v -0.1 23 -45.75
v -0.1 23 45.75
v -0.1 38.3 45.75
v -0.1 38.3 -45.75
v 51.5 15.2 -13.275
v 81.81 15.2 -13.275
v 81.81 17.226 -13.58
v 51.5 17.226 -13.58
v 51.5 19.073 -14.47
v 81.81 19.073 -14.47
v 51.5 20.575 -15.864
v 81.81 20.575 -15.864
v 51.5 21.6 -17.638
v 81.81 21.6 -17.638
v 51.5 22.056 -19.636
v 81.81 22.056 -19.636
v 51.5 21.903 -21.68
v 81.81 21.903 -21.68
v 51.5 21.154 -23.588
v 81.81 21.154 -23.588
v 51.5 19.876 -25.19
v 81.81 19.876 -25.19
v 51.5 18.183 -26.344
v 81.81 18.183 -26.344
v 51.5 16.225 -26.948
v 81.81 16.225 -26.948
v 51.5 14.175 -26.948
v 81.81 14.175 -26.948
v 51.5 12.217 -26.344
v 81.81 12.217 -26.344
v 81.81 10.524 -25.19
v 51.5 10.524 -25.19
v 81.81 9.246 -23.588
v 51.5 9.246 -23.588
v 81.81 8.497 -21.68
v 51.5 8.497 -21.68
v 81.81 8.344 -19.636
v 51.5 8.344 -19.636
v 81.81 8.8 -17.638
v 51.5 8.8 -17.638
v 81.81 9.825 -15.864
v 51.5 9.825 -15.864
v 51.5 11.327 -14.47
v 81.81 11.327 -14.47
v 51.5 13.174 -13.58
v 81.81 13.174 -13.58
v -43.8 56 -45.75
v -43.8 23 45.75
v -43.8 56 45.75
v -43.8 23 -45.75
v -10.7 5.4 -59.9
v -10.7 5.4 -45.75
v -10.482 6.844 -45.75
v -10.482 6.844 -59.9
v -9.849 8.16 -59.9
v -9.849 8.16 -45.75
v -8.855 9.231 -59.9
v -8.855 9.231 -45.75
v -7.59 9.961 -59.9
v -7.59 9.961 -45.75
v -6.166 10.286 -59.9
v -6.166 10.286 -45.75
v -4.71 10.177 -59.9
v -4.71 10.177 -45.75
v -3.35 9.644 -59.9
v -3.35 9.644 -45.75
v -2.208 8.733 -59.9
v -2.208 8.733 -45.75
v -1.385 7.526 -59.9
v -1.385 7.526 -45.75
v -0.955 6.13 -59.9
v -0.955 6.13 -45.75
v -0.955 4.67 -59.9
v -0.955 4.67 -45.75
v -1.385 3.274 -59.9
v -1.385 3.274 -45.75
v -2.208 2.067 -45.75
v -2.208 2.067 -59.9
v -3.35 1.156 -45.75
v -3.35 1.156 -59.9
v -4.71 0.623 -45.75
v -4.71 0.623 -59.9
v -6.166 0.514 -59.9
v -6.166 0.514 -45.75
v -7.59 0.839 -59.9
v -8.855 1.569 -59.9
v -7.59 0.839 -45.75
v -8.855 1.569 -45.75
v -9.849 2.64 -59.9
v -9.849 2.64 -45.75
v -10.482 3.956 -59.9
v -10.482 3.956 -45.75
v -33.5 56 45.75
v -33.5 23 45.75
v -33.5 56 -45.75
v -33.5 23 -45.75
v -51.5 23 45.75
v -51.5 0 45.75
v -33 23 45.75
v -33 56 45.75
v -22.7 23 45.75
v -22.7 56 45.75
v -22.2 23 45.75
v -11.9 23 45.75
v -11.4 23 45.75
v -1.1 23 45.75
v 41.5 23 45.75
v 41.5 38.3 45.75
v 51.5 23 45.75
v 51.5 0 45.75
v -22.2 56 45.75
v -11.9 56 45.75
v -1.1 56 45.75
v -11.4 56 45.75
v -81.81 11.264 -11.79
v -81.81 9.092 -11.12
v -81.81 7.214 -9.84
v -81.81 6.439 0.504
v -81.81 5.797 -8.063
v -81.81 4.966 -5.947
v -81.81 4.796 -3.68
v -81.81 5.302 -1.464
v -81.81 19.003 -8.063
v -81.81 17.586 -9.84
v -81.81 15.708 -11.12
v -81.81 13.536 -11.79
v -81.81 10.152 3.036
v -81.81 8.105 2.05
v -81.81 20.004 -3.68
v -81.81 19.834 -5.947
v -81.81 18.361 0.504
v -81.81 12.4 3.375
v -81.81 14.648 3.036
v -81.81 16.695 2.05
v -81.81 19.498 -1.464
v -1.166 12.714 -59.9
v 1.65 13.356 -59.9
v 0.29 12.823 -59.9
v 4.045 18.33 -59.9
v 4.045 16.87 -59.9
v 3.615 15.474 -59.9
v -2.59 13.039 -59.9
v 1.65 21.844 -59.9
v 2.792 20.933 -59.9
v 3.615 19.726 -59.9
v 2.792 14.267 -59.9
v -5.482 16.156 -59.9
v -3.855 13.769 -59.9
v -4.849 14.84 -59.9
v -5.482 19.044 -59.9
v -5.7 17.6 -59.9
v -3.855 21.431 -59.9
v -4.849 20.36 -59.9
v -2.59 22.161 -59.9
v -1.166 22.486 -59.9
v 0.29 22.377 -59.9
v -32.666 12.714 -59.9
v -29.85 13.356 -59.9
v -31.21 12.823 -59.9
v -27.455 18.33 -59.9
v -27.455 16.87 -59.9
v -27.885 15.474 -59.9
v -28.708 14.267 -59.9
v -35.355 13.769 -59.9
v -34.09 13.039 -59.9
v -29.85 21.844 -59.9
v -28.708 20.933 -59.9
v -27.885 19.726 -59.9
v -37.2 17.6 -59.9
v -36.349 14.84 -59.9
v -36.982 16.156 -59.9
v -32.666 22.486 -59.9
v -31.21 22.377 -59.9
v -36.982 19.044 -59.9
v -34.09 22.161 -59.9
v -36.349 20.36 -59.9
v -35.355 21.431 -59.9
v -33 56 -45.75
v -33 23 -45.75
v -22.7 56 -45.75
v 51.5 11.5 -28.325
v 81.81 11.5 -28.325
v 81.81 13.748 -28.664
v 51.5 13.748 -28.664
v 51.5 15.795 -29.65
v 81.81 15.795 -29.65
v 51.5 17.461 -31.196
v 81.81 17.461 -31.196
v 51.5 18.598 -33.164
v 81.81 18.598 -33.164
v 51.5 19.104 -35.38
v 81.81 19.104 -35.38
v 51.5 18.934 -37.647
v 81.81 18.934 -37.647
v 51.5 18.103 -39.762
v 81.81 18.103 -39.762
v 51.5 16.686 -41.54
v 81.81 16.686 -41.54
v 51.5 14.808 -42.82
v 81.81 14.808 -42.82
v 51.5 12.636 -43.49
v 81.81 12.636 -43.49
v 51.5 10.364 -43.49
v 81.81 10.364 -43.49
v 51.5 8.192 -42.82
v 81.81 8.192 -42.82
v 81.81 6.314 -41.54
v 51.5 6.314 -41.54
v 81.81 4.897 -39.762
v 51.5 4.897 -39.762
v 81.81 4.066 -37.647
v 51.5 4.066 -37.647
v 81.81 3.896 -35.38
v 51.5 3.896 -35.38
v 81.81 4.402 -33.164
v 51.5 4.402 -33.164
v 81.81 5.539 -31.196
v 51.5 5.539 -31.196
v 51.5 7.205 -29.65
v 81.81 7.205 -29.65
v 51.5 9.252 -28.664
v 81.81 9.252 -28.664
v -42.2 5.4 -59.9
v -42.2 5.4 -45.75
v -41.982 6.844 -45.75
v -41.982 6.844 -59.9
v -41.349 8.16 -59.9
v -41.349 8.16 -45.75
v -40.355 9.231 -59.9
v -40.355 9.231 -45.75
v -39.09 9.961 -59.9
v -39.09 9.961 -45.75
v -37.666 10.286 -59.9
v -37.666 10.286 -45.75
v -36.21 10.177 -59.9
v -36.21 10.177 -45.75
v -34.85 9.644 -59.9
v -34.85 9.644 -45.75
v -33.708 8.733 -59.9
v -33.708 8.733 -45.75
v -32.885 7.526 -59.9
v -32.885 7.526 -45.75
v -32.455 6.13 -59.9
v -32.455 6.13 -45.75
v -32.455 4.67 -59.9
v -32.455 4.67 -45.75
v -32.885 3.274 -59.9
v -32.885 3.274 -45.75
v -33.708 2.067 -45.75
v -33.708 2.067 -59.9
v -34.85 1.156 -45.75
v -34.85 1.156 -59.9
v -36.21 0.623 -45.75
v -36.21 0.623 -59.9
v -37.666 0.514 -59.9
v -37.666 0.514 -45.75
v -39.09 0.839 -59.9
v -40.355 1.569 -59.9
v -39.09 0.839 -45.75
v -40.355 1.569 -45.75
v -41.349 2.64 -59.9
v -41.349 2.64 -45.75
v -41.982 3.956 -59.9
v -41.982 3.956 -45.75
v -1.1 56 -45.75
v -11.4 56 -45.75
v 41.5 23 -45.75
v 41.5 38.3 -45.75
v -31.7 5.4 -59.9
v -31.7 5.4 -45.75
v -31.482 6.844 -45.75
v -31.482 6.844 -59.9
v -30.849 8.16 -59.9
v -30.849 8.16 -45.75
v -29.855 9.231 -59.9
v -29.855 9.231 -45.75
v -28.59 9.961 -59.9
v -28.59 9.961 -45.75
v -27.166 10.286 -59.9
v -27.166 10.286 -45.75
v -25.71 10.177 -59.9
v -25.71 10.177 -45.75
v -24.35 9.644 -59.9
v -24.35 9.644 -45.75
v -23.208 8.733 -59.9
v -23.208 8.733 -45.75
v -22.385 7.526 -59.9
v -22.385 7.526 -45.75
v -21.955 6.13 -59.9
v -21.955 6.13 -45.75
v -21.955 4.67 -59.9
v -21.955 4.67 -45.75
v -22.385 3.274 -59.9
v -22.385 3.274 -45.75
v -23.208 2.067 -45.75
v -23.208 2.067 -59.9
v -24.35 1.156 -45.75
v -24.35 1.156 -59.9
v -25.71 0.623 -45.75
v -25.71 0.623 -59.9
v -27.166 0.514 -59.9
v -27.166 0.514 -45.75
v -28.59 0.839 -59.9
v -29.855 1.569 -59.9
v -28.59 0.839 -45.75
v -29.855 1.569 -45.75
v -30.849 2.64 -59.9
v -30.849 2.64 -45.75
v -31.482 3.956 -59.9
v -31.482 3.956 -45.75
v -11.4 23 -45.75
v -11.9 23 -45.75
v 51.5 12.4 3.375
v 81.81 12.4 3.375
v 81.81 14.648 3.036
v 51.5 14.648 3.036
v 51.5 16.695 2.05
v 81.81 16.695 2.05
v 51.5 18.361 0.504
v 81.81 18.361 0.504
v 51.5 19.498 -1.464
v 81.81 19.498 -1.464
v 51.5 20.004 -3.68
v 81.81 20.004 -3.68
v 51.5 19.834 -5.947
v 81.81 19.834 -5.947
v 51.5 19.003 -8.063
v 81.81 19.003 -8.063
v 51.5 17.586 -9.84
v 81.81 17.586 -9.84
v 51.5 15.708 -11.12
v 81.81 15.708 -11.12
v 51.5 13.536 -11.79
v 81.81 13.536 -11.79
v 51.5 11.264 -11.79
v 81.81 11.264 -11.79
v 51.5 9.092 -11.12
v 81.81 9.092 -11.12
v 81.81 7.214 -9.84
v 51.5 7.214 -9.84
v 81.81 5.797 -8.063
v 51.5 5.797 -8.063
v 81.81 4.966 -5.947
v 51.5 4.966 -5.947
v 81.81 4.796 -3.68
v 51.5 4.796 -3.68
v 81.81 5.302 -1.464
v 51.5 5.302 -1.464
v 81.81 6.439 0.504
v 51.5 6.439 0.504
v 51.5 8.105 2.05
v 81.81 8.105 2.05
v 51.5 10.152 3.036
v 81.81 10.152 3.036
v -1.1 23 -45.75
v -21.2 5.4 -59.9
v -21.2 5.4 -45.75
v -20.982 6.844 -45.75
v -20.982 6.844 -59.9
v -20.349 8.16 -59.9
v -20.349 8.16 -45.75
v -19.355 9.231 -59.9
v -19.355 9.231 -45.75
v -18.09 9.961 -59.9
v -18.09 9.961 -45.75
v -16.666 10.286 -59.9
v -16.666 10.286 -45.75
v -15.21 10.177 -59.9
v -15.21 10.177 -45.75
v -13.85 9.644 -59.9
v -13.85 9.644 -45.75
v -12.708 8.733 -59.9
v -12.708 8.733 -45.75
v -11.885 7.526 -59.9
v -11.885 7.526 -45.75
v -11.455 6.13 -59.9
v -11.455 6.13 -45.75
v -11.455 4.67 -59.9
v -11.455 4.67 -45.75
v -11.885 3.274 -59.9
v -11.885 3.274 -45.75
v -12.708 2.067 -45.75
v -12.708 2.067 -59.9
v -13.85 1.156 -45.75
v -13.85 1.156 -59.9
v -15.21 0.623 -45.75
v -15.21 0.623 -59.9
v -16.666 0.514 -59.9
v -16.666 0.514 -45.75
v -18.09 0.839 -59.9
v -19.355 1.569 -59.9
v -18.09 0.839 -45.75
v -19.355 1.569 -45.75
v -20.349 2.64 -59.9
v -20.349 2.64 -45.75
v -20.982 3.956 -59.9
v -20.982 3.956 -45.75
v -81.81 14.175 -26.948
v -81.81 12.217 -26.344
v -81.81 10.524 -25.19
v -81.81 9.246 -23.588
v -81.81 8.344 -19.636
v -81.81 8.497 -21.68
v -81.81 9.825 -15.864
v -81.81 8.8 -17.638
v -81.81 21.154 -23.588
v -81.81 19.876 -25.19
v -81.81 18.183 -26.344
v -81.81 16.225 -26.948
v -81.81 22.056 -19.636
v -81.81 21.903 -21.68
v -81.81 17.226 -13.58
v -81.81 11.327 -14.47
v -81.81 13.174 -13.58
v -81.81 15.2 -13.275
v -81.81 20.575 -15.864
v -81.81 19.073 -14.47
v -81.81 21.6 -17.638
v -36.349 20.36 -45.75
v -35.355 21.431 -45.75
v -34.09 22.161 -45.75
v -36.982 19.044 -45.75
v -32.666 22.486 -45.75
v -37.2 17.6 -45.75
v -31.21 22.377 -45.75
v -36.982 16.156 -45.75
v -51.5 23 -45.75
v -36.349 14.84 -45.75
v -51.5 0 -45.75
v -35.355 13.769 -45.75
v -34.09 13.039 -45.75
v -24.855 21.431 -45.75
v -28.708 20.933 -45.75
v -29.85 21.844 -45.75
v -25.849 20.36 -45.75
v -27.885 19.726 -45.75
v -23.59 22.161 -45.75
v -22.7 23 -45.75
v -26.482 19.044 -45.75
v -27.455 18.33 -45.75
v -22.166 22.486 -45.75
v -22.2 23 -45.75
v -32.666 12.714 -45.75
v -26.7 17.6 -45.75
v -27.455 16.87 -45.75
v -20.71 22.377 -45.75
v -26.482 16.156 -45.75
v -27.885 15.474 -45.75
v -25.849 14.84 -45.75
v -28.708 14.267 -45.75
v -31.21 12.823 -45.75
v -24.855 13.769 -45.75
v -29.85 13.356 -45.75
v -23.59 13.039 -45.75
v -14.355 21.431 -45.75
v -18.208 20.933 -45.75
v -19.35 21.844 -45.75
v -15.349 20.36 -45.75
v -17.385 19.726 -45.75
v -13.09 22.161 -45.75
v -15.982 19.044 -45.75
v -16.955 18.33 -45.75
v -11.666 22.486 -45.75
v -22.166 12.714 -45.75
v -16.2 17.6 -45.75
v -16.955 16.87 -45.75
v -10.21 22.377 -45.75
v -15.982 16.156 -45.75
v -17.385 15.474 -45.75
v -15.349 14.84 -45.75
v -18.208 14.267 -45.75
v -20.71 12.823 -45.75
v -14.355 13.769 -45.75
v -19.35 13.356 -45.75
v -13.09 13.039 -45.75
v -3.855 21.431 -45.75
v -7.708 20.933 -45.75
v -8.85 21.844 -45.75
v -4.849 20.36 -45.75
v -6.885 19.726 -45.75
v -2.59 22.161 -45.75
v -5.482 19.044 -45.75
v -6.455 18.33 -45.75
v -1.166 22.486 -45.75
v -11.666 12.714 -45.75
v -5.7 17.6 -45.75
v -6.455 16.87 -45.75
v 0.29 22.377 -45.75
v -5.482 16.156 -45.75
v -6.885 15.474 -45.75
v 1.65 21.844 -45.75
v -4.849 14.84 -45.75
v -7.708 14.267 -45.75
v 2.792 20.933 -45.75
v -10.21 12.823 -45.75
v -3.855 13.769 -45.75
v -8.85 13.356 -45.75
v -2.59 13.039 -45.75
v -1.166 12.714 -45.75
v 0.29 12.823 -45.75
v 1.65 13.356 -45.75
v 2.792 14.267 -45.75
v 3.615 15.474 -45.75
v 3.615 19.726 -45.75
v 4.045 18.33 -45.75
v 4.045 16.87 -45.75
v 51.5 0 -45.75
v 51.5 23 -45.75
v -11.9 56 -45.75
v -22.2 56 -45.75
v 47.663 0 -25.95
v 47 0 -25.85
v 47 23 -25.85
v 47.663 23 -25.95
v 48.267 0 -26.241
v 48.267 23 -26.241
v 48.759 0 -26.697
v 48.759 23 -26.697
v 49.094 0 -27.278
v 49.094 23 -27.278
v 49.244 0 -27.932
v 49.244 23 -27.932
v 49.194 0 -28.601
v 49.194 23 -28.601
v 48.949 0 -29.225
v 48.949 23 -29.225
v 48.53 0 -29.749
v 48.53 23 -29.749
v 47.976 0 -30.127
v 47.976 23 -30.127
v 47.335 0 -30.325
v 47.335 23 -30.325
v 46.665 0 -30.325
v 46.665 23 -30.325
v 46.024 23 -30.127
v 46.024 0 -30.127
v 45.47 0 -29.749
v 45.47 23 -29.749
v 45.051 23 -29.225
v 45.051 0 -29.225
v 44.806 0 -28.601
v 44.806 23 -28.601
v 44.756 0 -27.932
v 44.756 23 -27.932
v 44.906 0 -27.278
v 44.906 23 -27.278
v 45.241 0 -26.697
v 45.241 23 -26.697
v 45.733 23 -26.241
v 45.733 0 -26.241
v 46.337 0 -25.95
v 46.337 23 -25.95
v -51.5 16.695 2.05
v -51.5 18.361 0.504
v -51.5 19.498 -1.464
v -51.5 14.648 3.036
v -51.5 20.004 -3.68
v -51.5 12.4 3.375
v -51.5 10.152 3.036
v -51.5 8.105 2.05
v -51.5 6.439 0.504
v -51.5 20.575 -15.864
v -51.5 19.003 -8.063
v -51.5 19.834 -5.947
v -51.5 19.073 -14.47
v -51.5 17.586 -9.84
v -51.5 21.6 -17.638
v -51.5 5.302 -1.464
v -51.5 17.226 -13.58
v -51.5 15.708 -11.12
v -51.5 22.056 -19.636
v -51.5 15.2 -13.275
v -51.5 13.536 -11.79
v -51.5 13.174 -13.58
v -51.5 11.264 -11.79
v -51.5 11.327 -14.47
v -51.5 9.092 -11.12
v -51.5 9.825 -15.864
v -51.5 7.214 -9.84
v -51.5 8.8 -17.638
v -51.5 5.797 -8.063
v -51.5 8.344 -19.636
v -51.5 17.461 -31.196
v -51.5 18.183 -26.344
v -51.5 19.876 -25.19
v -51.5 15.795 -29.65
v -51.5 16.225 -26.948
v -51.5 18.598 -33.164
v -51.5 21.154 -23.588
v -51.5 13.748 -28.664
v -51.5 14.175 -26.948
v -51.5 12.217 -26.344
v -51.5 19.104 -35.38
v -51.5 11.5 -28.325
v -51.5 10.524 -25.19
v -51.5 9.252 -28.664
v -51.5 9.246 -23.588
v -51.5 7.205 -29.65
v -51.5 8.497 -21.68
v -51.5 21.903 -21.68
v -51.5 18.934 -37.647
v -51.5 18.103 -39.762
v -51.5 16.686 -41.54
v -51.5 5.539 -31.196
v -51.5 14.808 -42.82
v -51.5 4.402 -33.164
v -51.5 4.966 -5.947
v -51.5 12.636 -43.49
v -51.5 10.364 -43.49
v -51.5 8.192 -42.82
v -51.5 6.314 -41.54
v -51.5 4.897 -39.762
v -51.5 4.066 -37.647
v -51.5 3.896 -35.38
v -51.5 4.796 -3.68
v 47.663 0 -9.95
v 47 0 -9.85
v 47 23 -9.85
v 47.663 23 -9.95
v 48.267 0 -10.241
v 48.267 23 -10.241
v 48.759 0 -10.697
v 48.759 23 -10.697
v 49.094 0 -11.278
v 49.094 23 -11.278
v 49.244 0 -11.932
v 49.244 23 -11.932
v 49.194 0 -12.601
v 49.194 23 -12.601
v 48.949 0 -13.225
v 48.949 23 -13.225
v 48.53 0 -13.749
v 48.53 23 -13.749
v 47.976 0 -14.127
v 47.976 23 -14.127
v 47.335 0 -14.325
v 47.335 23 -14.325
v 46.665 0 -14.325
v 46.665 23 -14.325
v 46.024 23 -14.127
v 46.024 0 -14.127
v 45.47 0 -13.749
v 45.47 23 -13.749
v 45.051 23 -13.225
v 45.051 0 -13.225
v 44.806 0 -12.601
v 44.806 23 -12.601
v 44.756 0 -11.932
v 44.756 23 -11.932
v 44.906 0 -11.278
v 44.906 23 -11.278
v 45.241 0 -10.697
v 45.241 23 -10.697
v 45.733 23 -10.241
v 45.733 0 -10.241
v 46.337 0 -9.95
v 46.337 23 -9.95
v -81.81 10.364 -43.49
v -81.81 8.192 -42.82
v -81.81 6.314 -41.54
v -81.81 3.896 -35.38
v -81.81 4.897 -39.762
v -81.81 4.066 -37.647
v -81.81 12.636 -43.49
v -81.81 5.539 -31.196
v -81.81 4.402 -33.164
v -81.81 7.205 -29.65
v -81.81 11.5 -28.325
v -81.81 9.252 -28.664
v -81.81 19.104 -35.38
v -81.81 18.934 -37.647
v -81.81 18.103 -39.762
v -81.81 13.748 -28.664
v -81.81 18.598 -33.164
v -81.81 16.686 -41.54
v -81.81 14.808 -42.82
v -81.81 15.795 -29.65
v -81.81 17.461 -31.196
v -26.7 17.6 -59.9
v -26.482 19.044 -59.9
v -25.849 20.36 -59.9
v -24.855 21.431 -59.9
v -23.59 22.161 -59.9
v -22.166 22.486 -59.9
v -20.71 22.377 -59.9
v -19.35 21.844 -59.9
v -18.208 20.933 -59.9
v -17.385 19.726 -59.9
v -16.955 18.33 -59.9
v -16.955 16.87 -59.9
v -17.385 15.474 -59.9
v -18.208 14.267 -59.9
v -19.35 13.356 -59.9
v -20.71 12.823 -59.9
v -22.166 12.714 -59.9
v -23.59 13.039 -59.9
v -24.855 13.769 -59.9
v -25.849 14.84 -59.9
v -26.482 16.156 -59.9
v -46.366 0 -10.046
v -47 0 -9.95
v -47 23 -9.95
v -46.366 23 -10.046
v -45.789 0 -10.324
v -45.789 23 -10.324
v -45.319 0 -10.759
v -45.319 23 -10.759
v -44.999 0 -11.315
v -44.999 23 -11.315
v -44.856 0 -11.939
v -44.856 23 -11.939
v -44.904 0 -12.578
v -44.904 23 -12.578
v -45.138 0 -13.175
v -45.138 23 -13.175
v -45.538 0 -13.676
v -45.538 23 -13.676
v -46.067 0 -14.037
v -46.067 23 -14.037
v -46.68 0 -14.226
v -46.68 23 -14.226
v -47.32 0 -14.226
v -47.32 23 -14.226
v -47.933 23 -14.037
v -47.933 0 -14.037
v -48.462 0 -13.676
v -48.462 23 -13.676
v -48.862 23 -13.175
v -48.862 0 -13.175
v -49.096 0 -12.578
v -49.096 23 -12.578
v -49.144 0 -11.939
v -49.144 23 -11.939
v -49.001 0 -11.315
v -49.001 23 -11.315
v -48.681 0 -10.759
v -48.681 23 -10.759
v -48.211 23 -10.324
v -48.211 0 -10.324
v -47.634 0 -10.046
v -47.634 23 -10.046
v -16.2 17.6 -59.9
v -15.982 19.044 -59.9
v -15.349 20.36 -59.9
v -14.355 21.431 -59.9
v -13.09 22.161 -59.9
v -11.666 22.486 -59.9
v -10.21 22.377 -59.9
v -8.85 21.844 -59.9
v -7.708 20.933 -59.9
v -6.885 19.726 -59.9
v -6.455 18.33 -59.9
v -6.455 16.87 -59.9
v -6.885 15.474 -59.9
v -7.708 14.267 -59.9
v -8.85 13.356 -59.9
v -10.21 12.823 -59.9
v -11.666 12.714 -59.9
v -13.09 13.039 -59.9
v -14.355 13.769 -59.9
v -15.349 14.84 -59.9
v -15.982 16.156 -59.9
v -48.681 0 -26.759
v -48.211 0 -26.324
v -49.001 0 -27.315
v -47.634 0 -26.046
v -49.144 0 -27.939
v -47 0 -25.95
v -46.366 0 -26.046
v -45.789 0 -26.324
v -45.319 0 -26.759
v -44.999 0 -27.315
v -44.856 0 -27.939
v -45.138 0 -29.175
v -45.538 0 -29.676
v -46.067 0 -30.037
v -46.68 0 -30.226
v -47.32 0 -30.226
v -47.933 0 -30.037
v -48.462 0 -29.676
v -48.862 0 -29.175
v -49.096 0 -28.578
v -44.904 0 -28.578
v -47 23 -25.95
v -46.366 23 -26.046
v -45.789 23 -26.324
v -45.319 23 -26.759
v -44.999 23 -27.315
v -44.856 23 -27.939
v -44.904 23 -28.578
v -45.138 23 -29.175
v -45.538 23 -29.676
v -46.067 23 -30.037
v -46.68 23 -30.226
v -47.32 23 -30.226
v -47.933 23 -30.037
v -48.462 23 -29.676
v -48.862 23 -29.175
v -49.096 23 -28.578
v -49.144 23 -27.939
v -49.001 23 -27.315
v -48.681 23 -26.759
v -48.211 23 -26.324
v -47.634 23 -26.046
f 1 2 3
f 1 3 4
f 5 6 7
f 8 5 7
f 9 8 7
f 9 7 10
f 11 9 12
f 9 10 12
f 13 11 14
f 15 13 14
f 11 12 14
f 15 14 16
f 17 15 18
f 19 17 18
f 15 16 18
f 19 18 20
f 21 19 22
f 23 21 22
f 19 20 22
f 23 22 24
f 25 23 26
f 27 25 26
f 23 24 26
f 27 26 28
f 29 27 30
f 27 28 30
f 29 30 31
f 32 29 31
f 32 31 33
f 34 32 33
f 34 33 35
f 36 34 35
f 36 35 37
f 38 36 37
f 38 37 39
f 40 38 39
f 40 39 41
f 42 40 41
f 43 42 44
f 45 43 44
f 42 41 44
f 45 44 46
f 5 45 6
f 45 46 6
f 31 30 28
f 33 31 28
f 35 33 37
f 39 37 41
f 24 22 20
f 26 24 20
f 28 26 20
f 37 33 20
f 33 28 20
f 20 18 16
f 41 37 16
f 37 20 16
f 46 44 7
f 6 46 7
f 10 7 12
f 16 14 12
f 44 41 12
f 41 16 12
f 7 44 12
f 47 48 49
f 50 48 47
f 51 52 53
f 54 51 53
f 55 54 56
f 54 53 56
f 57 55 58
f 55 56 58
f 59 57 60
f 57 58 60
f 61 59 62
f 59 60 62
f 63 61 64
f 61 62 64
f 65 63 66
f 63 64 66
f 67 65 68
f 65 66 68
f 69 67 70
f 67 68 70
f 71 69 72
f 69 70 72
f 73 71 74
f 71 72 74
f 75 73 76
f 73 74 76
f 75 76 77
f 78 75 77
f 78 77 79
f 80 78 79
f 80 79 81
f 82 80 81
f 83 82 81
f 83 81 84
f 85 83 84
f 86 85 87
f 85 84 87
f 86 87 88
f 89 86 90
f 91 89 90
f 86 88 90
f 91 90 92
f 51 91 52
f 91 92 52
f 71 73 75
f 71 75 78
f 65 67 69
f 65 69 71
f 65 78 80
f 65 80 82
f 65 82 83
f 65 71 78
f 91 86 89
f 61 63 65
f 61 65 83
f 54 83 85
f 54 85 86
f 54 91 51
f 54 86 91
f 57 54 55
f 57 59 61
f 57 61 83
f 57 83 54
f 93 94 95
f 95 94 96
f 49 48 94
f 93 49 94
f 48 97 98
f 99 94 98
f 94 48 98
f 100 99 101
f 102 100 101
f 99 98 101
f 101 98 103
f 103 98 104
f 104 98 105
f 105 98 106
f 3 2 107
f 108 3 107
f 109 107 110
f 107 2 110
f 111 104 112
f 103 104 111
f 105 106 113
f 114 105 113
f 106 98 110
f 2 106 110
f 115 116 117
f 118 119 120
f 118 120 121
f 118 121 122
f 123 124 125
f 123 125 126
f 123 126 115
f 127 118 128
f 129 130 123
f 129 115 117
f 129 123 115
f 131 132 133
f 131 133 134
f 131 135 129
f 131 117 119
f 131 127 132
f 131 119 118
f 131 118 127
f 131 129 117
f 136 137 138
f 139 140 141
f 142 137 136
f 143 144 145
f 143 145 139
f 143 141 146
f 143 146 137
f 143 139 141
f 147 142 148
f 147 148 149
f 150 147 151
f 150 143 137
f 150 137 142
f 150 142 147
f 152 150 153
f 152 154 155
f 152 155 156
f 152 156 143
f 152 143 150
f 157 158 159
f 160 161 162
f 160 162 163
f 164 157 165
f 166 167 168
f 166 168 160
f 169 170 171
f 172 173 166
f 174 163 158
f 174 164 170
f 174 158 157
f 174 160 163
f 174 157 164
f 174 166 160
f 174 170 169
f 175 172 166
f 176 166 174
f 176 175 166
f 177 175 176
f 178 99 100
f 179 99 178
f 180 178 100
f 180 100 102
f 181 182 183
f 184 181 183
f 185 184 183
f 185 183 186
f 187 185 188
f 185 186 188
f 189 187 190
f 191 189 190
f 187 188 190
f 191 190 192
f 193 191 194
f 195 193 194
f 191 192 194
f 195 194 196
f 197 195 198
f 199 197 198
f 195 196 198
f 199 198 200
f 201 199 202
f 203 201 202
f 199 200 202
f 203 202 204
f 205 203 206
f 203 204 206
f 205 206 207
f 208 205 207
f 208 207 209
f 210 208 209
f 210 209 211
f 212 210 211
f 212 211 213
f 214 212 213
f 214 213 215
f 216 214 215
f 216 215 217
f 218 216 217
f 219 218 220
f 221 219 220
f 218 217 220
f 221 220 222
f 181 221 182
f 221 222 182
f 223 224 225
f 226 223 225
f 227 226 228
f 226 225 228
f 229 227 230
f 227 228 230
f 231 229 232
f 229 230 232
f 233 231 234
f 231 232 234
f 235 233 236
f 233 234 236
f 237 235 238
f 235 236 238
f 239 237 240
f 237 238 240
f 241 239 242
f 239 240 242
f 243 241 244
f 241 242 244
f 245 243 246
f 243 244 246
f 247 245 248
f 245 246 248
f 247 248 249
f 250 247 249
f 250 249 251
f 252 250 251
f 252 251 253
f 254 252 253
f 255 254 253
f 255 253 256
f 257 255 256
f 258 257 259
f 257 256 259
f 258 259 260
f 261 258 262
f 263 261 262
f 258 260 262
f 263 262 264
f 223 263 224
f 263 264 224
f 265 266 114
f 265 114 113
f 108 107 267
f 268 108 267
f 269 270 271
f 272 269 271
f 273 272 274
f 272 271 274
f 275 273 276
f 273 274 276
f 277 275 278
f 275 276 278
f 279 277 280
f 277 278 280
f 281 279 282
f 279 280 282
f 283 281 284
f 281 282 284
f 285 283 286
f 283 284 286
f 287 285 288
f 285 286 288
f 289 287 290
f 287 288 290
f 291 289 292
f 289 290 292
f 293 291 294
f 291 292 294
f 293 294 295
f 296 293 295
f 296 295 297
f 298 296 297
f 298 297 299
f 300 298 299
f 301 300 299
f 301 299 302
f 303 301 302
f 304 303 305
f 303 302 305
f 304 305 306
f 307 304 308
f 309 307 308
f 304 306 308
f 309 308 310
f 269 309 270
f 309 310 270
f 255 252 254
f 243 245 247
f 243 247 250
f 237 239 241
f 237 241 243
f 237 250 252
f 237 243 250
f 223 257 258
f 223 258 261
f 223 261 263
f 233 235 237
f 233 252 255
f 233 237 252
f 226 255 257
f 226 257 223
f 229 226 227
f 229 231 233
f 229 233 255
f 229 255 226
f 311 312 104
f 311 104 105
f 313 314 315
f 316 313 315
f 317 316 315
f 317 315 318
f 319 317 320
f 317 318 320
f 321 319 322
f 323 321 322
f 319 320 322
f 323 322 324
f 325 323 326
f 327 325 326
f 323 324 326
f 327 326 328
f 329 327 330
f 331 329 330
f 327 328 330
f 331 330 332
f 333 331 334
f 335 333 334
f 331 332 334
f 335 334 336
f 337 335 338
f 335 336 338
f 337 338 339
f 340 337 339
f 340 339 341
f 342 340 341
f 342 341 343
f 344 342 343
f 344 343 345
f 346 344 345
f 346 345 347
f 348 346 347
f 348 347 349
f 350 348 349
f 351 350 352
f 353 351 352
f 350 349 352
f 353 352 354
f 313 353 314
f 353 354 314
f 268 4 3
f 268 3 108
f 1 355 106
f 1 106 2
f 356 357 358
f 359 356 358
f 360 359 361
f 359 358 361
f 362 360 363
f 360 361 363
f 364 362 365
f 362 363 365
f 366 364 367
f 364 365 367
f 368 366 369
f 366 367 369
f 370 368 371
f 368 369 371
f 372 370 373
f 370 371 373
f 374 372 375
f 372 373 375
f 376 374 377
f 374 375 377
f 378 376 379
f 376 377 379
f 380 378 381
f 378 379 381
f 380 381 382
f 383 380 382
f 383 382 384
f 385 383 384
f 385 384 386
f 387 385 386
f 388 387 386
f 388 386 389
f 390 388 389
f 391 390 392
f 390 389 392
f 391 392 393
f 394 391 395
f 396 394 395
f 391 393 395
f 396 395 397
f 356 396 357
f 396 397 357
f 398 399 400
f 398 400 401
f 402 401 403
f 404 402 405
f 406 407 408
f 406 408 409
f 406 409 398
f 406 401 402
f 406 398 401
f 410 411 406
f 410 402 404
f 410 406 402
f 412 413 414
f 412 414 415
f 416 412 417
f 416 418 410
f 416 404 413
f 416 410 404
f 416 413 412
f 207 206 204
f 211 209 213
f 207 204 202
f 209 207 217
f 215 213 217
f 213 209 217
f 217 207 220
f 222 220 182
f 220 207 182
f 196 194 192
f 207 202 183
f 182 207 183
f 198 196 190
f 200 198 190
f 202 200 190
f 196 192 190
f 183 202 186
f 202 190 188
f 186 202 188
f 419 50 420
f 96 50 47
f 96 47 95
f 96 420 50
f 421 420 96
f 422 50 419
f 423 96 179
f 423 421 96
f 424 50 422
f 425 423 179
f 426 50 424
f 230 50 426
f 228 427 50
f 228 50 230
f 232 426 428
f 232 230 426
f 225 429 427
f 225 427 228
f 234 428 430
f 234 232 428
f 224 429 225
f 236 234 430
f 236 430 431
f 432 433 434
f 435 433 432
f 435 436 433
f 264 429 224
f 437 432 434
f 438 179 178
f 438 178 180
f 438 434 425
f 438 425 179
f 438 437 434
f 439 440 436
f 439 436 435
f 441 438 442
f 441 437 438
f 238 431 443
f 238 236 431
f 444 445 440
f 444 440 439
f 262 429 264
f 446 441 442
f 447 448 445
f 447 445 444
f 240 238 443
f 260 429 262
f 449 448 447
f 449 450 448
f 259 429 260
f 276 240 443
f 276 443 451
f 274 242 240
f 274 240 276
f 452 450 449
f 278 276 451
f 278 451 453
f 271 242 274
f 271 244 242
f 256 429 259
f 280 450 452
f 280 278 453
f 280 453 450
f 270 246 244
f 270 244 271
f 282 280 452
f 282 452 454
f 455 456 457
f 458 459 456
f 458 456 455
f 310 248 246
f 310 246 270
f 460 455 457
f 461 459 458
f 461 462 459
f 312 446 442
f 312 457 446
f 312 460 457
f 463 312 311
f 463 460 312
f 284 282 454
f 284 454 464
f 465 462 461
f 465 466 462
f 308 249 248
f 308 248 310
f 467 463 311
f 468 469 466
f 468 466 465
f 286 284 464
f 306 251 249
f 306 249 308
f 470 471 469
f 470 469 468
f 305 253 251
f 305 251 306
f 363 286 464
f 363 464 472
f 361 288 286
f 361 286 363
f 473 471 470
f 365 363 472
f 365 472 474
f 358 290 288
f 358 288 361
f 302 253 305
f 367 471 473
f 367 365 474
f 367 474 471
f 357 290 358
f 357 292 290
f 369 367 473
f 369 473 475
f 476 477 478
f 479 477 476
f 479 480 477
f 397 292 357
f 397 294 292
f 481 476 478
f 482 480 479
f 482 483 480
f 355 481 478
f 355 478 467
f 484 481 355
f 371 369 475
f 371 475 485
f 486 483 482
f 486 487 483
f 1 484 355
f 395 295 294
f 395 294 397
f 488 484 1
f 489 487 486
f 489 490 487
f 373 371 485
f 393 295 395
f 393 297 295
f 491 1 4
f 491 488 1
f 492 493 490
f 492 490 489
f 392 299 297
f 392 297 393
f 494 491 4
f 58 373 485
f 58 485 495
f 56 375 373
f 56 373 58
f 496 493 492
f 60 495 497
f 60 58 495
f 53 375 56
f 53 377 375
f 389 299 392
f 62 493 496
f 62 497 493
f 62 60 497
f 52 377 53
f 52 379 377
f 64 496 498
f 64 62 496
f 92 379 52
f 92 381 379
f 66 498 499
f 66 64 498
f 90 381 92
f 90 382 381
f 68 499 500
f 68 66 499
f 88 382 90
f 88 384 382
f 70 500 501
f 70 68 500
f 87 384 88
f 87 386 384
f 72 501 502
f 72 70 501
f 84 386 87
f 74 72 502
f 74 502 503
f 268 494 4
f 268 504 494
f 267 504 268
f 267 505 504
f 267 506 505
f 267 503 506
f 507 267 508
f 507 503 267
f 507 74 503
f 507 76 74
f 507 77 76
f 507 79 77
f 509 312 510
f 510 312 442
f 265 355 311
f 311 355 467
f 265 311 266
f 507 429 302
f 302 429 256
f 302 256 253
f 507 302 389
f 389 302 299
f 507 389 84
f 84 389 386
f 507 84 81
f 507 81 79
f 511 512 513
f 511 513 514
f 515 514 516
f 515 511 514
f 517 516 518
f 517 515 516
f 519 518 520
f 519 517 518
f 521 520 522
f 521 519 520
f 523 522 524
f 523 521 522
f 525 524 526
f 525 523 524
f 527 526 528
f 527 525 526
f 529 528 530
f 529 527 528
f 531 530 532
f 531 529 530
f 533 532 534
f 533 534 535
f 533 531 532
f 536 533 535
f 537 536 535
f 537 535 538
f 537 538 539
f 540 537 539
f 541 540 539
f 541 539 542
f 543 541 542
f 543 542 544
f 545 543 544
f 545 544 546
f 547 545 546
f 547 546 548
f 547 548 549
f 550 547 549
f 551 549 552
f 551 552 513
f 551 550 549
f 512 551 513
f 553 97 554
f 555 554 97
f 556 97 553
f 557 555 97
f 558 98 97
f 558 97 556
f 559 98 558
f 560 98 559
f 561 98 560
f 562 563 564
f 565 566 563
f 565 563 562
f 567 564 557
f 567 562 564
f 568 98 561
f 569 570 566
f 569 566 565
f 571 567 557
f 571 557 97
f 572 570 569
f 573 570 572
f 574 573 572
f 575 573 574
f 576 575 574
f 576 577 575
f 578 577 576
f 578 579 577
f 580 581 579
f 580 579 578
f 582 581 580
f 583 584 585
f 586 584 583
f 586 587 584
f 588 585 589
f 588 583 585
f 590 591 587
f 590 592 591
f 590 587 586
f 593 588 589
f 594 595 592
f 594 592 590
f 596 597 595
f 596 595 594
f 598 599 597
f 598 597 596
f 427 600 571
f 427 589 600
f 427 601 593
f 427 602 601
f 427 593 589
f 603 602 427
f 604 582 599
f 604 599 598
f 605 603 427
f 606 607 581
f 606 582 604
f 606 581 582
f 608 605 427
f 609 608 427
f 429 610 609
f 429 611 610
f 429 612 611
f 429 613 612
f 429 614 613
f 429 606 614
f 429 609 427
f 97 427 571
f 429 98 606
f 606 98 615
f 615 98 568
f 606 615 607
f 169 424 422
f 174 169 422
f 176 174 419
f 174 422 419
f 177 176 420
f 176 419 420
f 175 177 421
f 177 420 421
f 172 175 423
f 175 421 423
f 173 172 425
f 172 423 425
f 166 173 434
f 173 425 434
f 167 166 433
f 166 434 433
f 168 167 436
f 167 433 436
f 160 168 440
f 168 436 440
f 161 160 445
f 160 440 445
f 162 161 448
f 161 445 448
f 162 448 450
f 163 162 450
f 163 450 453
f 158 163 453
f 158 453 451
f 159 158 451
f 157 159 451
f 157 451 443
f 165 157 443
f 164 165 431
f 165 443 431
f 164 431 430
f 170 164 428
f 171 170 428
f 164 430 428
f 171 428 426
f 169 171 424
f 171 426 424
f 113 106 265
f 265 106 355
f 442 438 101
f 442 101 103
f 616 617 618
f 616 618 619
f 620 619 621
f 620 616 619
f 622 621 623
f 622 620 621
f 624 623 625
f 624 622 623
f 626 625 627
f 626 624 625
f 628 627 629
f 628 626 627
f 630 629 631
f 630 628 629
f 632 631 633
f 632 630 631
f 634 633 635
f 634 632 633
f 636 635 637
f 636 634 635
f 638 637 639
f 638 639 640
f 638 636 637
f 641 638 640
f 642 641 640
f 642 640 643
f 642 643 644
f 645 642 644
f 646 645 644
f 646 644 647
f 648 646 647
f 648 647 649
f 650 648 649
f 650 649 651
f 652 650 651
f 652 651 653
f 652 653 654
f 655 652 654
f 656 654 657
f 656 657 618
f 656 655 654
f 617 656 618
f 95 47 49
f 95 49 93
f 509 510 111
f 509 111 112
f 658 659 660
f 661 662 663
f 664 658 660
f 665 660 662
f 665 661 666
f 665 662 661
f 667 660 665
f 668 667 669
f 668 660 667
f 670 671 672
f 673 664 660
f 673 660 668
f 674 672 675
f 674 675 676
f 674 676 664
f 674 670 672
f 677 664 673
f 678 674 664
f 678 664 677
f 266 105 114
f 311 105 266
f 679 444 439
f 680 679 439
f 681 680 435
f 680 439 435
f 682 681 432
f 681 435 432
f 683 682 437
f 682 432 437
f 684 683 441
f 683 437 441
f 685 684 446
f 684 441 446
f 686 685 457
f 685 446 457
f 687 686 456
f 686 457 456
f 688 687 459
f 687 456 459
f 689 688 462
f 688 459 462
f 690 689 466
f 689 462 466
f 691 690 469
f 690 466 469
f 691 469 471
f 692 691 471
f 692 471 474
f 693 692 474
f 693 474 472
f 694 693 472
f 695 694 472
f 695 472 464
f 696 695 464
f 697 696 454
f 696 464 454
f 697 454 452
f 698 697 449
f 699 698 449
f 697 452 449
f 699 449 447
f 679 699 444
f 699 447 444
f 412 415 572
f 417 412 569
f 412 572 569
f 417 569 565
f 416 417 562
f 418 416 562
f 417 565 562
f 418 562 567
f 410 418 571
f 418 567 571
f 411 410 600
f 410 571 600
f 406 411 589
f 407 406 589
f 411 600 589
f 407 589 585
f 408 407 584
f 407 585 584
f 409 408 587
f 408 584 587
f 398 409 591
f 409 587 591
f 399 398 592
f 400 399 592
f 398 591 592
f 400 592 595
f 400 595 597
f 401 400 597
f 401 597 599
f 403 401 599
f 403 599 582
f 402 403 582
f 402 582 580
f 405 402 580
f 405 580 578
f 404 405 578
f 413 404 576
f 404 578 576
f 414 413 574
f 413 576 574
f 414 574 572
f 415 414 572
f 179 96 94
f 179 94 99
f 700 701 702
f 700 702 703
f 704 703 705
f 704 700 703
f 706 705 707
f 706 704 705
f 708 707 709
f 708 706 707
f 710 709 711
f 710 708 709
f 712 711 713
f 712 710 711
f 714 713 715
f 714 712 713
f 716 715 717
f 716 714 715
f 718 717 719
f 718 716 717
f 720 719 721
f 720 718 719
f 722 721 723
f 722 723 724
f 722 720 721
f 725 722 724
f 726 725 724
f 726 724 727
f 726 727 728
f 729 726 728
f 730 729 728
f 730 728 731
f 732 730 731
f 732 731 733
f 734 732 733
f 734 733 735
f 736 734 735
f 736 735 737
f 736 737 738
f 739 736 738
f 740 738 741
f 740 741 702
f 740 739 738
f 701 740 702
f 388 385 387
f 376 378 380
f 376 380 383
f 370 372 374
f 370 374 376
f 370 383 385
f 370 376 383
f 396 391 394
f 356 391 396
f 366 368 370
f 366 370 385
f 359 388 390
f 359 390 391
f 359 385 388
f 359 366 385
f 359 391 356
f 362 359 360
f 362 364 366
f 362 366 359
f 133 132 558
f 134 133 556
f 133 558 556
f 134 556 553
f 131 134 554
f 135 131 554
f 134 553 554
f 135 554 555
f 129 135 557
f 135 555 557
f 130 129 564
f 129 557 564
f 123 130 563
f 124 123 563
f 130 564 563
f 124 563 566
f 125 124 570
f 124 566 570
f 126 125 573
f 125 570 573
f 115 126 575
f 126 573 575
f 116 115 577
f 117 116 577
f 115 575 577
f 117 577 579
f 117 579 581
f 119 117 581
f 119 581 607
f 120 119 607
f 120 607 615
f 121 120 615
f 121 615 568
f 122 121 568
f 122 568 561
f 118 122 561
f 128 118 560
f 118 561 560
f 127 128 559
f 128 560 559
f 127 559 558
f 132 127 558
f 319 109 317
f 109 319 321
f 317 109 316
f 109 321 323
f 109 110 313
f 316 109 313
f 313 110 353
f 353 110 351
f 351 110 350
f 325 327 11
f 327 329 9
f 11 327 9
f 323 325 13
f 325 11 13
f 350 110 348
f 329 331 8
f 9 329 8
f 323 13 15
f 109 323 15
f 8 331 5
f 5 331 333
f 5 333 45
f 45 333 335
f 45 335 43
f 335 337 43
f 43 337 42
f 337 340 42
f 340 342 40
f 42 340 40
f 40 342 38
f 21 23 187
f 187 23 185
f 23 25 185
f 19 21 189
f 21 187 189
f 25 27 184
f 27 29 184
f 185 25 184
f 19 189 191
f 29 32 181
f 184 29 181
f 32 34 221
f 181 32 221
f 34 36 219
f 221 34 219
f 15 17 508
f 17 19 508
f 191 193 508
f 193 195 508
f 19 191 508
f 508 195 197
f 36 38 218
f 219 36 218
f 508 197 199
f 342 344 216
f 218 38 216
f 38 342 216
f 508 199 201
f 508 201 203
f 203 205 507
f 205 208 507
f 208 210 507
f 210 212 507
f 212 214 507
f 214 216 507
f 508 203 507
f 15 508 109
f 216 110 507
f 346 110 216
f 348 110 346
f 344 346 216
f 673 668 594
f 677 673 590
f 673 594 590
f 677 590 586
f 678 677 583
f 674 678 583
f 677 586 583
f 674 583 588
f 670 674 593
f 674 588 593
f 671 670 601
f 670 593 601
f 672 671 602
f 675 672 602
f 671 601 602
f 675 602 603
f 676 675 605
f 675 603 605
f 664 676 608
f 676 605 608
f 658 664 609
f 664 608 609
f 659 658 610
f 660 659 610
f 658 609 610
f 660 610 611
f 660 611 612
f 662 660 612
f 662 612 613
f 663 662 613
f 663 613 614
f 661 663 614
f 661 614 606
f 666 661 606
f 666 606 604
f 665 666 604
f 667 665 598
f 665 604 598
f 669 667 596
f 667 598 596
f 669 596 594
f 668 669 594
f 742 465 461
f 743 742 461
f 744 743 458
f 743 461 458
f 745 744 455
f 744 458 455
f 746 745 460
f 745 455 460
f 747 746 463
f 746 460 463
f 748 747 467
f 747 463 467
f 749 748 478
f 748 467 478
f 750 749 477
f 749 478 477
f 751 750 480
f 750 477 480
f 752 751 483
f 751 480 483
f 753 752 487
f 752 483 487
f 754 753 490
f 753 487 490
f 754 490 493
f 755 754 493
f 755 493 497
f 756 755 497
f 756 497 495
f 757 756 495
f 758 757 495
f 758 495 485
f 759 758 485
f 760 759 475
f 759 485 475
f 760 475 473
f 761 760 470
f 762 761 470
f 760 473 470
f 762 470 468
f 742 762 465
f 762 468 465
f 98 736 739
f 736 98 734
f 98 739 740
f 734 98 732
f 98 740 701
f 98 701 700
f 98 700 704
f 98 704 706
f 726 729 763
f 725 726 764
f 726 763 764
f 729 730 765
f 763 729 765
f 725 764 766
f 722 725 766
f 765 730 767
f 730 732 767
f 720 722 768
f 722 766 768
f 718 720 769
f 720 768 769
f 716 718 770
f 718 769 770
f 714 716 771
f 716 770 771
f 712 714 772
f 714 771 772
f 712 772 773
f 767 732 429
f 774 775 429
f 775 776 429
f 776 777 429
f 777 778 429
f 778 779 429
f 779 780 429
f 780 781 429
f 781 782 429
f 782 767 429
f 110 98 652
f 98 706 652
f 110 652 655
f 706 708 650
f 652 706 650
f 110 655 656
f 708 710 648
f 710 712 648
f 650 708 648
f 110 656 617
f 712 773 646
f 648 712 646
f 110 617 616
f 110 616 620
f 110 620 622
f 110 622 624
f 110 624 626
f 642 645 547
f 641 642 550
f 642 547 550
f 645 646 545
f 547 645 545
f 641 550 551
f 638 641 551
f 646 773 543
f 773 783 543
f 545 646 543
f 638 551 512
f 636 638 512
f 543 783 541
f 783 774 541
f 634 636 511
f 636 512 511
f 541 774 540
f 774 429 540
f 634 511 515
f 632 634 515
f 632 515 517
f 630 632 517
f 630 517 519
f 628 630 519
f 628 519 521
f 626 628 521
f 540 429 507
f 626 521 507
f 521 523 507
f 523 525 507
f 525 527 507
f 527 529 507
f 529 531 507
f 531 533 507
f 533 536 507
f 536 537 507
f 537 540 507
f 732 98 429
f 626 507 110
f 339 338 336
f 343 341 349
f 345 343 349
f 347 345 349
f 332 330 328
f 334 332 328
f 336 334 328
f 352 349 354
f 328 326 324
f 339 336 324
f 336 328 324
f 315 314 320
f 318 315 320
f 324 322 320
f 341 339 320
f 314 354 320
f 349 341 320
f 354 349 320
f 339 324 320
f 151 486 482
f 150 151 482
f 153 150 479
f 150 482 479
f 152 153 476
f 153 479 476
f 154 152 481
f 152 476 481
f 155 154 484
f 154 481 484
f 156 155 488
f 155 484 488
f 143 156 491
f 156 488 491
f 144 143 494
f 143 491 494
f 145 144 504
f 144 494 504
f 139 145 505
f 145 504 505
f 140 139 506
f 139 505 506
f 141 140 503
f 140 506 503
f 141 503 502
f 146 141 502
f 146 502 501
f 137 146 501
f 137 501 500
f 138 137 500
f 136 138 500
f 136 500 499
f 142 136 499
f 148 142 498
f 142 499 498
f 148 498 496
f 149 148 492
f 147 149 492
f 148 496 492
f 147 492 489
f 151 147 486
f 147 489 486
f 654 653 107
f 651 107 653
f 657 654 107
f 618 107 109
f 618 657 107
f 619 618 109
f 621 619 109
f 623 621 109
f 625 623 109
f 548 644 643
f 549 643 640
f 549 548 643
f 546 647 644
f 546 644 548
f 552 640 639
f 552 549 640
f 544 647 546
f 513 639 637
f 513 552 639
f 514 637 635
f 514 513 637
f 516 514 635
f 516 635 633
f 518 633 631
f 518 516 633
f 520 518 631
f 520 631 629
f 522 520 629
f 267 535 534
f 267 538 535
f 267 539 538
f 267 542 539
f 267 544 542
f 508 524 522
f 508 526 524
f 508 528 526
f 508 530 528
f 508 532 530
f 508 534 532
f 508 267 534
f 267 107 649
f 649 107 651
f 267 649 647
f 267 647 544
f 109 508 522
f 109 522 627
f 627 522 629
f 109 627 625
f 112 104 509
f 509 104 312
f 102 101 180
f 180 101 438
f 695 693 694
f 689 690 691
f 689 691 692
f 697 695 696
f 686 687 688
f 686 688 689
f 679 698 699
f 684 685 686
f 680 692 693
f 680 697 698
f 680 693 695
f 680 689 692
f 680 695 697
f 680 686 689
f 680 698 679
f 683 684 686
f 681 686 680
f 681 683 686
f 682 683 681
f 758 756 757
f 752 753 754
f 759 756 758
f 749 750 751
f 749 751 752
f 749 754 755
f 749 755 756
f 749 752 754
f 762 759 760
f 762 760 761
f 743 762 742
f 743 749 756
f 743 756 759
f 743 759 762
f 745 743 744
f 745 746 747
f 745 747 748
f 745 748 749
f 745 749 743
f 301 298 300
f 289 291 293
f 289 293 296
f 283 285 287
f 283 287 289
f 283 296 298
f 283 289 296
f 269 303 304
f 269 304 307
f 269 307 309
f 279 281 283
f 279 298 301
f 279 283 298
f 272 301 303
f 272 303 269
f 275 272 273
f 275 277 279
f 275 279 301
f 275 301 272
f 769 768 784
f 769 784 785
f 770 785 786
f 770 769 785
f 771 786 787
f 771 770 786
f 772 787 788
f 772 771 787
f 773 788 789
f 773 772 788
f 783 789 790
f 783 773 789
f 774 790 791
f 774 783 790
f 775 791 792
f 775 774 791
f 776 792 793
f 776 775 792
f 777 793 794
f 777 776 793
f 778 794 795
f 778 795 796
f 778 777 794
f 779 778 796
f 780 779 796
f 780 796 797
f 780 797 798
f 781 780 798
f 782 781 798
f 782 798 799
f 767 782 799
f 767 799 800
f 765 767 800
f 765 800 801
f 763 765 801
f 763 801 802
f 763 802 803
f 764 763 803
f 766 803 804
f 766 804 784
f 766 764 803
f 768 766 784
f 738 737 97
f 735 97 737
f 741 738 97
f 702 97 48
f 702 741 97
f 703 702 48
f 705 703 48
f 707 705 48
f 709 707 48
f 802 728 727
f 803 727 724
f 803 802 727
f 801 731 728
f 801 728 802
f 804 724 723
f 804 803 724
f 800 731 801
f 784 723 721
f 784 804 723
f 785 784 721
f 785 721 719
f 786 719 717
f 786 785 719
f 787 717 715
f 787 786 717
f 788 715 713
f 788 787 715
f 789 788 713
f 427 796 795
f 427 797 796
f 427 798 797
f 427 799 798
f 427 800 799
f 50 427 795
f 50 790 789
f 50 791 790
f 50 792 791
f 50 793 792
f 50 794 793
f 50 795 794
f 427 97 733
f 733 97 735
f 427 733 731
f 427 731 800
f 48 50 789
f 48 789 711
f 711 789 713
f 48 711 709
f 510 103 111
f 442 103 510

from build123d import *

# Parameters (mm, degrees)
SKETCH1_W           = 103
SKETCH1_H           = 91.5
SKETCH1_R           = 2.15
SKETCH1_R_2         = 2.25
BOSS_EXTRUDE1_DEPTH = 23
SKETCH2_R           = 7.625
SKETCH2_R_2         = 6.875
BOSS_EXTRUDE2_DEPTH = 30.31
SKETCH4_R           = 4.9
BOSS_EXTRUDE3_DEPTH = 14.15
BOSS_EXTRUDE4_START = -133.31
SKETCH2_7_R         = 7.625
SKETCH2_7_R_2       = 6.875
BOSS_EXTRUDE4_DEPTH = 30.31
SKETCH6_W           = 41.6
SKETCH6_H           = 91.5
BOSS_EXTRUDE5_DEPTH = 15.3
SKETCH6_5_W         = 10.3
SKETCH6_5_H         = 91.5
BOSS_EXTRUDE7_DEPTH = 33


with BuildPart() as part:
    # Sketch1 → Boss-Extrude1 (new body)
    with BuildSketch(Plane(origin=(0, 0, 0), x_dir=(1, 0, 0), z_dir=(0, 1, 0))):
        Rectangle(SKETCH1_W, SKETCH1_H)
        with Locations(Location((-47, 28.1, 0), (0, 0, 270))):
            Circle(SKETCH1_R, mode=Mode.SUBTRACT)
        with Locations(Location((-47, 12.1, 0), (0, 0, 270))):
            Circle(SKETCH1_R, mode=Mode.SUBTRACT)
        with Locations(Location((47, 28.1, 0), (0, 0, 270))):
            Circle(SKETCH1_R_2, mode=Mode.SUBTRACT)
        with Locations(Location((47, 12.1, 0), (0, 0, 270))):
            Circle(SKETCH1_R_2, mode=Mode.SUBTRACT)
    extrude(amount=BOSS_EXTRUDE1_DEPTH)

    # Sketch2 → Boss-Extrude2 (add)
    with BuildSketch(Plane.ZY.offset(51.5)):
        with Locations((-35.95, 11.5)):
            Circle(SKETCH2_R)
        with Locations((-20.15, 15.2)):
            Circle(SKETCH2_R_2)
        with Locations((-4.25, 12.4)):
            Circle(SKETCH2_R)
    extrude(amount=BOSS_EXTRUDE2_DEPTH)

    # Sketch4 → Boss-Extrude3 (add)
    with BuildSketch(Plane(origin=(0, 0, -45.75), x_dir=(-1, 0, 0), z_dir=(0, 0, -1))):
        with Locations((5.8, 5.4)):
            Circle(SKETCH4_R)
        with Locations((0.8, 17.6)):
            Circle(SKETCH4_R)
        with Locations((11.3, 17.6)):
            Circle(SKETCH4_R)
        with Locations((16.3, 5.4)):
            Circle(SKETCH4_R)
        with Locations((21.8, 17.6)):
            Circle(SKETCH4_R)
        with Locations((26.8, 5.4)):
            Circle(SKETCH4_R)
        with Locations((32.3, 17.6)):
            Circle(SKETCH4_R)
        with Locations((37.3, 5.4)):
            Circle(SKETCH4_R)
    extrude(amount=BOSS_EXTRUDE3_DEPTH)

    # Sketch2<7> → Boss-Extrude4 (add)
    with BuildSketch(Plane.ZY.offset(51.5).offset(BOSS_EXTRUDE4_START)):
        with Locations((-35.95, 11.5)):
            Circle(SKETCH2_7_R)
        with Locations((-20.15, 15.2)):
            Circle(SKETCH2_7_R_2)
        with Locations((-4.25, 12.4)):
            Circle(SKETCH2_7_R)
    extrude(amount=BOSS_EXTRUDE4_DEPTH)

    # Sketch6 → Boss-Extrude5 (add)
    with BuildSketch(Plane(origin=(0, 23, 0), x_dir=(1, 0, 0), z_dir=(0, 1, 0))):
        with Locations((20.7, 0)):
            Rectangle(SKETCH6_W, SKETCH6_H)
    extrude(amount=BOSS_EXTRUDE5_DEPTH)

    # Sketch6<5> → Boss-Extrude7 (add)
    with BuildSketch(Plane(origin=(0, 23, 0), x_dir=(1, 0, 0), z_dir=(0, 1, 0))):
        with Locations((-17.05, 0)):
            Rectangle(SKETCH6_5_W, SKETCH6_5_H)
        with Locations((-6.25, 0)):
            Rectangle(SKETCH6_5_W, SKETCH6_5_H)
        with Locations((-27.85, 0)):
            Rectangle(SKETCH6_5_W, SKETCH6_5_H)
        with Locations((-38.65, 0)):
            Rectangle(SKETCH6_5_W, SKETCH6_5_H)
    extrude(amount=BOSS_EXTRUDE7_DEPTH)


solid = part.part
